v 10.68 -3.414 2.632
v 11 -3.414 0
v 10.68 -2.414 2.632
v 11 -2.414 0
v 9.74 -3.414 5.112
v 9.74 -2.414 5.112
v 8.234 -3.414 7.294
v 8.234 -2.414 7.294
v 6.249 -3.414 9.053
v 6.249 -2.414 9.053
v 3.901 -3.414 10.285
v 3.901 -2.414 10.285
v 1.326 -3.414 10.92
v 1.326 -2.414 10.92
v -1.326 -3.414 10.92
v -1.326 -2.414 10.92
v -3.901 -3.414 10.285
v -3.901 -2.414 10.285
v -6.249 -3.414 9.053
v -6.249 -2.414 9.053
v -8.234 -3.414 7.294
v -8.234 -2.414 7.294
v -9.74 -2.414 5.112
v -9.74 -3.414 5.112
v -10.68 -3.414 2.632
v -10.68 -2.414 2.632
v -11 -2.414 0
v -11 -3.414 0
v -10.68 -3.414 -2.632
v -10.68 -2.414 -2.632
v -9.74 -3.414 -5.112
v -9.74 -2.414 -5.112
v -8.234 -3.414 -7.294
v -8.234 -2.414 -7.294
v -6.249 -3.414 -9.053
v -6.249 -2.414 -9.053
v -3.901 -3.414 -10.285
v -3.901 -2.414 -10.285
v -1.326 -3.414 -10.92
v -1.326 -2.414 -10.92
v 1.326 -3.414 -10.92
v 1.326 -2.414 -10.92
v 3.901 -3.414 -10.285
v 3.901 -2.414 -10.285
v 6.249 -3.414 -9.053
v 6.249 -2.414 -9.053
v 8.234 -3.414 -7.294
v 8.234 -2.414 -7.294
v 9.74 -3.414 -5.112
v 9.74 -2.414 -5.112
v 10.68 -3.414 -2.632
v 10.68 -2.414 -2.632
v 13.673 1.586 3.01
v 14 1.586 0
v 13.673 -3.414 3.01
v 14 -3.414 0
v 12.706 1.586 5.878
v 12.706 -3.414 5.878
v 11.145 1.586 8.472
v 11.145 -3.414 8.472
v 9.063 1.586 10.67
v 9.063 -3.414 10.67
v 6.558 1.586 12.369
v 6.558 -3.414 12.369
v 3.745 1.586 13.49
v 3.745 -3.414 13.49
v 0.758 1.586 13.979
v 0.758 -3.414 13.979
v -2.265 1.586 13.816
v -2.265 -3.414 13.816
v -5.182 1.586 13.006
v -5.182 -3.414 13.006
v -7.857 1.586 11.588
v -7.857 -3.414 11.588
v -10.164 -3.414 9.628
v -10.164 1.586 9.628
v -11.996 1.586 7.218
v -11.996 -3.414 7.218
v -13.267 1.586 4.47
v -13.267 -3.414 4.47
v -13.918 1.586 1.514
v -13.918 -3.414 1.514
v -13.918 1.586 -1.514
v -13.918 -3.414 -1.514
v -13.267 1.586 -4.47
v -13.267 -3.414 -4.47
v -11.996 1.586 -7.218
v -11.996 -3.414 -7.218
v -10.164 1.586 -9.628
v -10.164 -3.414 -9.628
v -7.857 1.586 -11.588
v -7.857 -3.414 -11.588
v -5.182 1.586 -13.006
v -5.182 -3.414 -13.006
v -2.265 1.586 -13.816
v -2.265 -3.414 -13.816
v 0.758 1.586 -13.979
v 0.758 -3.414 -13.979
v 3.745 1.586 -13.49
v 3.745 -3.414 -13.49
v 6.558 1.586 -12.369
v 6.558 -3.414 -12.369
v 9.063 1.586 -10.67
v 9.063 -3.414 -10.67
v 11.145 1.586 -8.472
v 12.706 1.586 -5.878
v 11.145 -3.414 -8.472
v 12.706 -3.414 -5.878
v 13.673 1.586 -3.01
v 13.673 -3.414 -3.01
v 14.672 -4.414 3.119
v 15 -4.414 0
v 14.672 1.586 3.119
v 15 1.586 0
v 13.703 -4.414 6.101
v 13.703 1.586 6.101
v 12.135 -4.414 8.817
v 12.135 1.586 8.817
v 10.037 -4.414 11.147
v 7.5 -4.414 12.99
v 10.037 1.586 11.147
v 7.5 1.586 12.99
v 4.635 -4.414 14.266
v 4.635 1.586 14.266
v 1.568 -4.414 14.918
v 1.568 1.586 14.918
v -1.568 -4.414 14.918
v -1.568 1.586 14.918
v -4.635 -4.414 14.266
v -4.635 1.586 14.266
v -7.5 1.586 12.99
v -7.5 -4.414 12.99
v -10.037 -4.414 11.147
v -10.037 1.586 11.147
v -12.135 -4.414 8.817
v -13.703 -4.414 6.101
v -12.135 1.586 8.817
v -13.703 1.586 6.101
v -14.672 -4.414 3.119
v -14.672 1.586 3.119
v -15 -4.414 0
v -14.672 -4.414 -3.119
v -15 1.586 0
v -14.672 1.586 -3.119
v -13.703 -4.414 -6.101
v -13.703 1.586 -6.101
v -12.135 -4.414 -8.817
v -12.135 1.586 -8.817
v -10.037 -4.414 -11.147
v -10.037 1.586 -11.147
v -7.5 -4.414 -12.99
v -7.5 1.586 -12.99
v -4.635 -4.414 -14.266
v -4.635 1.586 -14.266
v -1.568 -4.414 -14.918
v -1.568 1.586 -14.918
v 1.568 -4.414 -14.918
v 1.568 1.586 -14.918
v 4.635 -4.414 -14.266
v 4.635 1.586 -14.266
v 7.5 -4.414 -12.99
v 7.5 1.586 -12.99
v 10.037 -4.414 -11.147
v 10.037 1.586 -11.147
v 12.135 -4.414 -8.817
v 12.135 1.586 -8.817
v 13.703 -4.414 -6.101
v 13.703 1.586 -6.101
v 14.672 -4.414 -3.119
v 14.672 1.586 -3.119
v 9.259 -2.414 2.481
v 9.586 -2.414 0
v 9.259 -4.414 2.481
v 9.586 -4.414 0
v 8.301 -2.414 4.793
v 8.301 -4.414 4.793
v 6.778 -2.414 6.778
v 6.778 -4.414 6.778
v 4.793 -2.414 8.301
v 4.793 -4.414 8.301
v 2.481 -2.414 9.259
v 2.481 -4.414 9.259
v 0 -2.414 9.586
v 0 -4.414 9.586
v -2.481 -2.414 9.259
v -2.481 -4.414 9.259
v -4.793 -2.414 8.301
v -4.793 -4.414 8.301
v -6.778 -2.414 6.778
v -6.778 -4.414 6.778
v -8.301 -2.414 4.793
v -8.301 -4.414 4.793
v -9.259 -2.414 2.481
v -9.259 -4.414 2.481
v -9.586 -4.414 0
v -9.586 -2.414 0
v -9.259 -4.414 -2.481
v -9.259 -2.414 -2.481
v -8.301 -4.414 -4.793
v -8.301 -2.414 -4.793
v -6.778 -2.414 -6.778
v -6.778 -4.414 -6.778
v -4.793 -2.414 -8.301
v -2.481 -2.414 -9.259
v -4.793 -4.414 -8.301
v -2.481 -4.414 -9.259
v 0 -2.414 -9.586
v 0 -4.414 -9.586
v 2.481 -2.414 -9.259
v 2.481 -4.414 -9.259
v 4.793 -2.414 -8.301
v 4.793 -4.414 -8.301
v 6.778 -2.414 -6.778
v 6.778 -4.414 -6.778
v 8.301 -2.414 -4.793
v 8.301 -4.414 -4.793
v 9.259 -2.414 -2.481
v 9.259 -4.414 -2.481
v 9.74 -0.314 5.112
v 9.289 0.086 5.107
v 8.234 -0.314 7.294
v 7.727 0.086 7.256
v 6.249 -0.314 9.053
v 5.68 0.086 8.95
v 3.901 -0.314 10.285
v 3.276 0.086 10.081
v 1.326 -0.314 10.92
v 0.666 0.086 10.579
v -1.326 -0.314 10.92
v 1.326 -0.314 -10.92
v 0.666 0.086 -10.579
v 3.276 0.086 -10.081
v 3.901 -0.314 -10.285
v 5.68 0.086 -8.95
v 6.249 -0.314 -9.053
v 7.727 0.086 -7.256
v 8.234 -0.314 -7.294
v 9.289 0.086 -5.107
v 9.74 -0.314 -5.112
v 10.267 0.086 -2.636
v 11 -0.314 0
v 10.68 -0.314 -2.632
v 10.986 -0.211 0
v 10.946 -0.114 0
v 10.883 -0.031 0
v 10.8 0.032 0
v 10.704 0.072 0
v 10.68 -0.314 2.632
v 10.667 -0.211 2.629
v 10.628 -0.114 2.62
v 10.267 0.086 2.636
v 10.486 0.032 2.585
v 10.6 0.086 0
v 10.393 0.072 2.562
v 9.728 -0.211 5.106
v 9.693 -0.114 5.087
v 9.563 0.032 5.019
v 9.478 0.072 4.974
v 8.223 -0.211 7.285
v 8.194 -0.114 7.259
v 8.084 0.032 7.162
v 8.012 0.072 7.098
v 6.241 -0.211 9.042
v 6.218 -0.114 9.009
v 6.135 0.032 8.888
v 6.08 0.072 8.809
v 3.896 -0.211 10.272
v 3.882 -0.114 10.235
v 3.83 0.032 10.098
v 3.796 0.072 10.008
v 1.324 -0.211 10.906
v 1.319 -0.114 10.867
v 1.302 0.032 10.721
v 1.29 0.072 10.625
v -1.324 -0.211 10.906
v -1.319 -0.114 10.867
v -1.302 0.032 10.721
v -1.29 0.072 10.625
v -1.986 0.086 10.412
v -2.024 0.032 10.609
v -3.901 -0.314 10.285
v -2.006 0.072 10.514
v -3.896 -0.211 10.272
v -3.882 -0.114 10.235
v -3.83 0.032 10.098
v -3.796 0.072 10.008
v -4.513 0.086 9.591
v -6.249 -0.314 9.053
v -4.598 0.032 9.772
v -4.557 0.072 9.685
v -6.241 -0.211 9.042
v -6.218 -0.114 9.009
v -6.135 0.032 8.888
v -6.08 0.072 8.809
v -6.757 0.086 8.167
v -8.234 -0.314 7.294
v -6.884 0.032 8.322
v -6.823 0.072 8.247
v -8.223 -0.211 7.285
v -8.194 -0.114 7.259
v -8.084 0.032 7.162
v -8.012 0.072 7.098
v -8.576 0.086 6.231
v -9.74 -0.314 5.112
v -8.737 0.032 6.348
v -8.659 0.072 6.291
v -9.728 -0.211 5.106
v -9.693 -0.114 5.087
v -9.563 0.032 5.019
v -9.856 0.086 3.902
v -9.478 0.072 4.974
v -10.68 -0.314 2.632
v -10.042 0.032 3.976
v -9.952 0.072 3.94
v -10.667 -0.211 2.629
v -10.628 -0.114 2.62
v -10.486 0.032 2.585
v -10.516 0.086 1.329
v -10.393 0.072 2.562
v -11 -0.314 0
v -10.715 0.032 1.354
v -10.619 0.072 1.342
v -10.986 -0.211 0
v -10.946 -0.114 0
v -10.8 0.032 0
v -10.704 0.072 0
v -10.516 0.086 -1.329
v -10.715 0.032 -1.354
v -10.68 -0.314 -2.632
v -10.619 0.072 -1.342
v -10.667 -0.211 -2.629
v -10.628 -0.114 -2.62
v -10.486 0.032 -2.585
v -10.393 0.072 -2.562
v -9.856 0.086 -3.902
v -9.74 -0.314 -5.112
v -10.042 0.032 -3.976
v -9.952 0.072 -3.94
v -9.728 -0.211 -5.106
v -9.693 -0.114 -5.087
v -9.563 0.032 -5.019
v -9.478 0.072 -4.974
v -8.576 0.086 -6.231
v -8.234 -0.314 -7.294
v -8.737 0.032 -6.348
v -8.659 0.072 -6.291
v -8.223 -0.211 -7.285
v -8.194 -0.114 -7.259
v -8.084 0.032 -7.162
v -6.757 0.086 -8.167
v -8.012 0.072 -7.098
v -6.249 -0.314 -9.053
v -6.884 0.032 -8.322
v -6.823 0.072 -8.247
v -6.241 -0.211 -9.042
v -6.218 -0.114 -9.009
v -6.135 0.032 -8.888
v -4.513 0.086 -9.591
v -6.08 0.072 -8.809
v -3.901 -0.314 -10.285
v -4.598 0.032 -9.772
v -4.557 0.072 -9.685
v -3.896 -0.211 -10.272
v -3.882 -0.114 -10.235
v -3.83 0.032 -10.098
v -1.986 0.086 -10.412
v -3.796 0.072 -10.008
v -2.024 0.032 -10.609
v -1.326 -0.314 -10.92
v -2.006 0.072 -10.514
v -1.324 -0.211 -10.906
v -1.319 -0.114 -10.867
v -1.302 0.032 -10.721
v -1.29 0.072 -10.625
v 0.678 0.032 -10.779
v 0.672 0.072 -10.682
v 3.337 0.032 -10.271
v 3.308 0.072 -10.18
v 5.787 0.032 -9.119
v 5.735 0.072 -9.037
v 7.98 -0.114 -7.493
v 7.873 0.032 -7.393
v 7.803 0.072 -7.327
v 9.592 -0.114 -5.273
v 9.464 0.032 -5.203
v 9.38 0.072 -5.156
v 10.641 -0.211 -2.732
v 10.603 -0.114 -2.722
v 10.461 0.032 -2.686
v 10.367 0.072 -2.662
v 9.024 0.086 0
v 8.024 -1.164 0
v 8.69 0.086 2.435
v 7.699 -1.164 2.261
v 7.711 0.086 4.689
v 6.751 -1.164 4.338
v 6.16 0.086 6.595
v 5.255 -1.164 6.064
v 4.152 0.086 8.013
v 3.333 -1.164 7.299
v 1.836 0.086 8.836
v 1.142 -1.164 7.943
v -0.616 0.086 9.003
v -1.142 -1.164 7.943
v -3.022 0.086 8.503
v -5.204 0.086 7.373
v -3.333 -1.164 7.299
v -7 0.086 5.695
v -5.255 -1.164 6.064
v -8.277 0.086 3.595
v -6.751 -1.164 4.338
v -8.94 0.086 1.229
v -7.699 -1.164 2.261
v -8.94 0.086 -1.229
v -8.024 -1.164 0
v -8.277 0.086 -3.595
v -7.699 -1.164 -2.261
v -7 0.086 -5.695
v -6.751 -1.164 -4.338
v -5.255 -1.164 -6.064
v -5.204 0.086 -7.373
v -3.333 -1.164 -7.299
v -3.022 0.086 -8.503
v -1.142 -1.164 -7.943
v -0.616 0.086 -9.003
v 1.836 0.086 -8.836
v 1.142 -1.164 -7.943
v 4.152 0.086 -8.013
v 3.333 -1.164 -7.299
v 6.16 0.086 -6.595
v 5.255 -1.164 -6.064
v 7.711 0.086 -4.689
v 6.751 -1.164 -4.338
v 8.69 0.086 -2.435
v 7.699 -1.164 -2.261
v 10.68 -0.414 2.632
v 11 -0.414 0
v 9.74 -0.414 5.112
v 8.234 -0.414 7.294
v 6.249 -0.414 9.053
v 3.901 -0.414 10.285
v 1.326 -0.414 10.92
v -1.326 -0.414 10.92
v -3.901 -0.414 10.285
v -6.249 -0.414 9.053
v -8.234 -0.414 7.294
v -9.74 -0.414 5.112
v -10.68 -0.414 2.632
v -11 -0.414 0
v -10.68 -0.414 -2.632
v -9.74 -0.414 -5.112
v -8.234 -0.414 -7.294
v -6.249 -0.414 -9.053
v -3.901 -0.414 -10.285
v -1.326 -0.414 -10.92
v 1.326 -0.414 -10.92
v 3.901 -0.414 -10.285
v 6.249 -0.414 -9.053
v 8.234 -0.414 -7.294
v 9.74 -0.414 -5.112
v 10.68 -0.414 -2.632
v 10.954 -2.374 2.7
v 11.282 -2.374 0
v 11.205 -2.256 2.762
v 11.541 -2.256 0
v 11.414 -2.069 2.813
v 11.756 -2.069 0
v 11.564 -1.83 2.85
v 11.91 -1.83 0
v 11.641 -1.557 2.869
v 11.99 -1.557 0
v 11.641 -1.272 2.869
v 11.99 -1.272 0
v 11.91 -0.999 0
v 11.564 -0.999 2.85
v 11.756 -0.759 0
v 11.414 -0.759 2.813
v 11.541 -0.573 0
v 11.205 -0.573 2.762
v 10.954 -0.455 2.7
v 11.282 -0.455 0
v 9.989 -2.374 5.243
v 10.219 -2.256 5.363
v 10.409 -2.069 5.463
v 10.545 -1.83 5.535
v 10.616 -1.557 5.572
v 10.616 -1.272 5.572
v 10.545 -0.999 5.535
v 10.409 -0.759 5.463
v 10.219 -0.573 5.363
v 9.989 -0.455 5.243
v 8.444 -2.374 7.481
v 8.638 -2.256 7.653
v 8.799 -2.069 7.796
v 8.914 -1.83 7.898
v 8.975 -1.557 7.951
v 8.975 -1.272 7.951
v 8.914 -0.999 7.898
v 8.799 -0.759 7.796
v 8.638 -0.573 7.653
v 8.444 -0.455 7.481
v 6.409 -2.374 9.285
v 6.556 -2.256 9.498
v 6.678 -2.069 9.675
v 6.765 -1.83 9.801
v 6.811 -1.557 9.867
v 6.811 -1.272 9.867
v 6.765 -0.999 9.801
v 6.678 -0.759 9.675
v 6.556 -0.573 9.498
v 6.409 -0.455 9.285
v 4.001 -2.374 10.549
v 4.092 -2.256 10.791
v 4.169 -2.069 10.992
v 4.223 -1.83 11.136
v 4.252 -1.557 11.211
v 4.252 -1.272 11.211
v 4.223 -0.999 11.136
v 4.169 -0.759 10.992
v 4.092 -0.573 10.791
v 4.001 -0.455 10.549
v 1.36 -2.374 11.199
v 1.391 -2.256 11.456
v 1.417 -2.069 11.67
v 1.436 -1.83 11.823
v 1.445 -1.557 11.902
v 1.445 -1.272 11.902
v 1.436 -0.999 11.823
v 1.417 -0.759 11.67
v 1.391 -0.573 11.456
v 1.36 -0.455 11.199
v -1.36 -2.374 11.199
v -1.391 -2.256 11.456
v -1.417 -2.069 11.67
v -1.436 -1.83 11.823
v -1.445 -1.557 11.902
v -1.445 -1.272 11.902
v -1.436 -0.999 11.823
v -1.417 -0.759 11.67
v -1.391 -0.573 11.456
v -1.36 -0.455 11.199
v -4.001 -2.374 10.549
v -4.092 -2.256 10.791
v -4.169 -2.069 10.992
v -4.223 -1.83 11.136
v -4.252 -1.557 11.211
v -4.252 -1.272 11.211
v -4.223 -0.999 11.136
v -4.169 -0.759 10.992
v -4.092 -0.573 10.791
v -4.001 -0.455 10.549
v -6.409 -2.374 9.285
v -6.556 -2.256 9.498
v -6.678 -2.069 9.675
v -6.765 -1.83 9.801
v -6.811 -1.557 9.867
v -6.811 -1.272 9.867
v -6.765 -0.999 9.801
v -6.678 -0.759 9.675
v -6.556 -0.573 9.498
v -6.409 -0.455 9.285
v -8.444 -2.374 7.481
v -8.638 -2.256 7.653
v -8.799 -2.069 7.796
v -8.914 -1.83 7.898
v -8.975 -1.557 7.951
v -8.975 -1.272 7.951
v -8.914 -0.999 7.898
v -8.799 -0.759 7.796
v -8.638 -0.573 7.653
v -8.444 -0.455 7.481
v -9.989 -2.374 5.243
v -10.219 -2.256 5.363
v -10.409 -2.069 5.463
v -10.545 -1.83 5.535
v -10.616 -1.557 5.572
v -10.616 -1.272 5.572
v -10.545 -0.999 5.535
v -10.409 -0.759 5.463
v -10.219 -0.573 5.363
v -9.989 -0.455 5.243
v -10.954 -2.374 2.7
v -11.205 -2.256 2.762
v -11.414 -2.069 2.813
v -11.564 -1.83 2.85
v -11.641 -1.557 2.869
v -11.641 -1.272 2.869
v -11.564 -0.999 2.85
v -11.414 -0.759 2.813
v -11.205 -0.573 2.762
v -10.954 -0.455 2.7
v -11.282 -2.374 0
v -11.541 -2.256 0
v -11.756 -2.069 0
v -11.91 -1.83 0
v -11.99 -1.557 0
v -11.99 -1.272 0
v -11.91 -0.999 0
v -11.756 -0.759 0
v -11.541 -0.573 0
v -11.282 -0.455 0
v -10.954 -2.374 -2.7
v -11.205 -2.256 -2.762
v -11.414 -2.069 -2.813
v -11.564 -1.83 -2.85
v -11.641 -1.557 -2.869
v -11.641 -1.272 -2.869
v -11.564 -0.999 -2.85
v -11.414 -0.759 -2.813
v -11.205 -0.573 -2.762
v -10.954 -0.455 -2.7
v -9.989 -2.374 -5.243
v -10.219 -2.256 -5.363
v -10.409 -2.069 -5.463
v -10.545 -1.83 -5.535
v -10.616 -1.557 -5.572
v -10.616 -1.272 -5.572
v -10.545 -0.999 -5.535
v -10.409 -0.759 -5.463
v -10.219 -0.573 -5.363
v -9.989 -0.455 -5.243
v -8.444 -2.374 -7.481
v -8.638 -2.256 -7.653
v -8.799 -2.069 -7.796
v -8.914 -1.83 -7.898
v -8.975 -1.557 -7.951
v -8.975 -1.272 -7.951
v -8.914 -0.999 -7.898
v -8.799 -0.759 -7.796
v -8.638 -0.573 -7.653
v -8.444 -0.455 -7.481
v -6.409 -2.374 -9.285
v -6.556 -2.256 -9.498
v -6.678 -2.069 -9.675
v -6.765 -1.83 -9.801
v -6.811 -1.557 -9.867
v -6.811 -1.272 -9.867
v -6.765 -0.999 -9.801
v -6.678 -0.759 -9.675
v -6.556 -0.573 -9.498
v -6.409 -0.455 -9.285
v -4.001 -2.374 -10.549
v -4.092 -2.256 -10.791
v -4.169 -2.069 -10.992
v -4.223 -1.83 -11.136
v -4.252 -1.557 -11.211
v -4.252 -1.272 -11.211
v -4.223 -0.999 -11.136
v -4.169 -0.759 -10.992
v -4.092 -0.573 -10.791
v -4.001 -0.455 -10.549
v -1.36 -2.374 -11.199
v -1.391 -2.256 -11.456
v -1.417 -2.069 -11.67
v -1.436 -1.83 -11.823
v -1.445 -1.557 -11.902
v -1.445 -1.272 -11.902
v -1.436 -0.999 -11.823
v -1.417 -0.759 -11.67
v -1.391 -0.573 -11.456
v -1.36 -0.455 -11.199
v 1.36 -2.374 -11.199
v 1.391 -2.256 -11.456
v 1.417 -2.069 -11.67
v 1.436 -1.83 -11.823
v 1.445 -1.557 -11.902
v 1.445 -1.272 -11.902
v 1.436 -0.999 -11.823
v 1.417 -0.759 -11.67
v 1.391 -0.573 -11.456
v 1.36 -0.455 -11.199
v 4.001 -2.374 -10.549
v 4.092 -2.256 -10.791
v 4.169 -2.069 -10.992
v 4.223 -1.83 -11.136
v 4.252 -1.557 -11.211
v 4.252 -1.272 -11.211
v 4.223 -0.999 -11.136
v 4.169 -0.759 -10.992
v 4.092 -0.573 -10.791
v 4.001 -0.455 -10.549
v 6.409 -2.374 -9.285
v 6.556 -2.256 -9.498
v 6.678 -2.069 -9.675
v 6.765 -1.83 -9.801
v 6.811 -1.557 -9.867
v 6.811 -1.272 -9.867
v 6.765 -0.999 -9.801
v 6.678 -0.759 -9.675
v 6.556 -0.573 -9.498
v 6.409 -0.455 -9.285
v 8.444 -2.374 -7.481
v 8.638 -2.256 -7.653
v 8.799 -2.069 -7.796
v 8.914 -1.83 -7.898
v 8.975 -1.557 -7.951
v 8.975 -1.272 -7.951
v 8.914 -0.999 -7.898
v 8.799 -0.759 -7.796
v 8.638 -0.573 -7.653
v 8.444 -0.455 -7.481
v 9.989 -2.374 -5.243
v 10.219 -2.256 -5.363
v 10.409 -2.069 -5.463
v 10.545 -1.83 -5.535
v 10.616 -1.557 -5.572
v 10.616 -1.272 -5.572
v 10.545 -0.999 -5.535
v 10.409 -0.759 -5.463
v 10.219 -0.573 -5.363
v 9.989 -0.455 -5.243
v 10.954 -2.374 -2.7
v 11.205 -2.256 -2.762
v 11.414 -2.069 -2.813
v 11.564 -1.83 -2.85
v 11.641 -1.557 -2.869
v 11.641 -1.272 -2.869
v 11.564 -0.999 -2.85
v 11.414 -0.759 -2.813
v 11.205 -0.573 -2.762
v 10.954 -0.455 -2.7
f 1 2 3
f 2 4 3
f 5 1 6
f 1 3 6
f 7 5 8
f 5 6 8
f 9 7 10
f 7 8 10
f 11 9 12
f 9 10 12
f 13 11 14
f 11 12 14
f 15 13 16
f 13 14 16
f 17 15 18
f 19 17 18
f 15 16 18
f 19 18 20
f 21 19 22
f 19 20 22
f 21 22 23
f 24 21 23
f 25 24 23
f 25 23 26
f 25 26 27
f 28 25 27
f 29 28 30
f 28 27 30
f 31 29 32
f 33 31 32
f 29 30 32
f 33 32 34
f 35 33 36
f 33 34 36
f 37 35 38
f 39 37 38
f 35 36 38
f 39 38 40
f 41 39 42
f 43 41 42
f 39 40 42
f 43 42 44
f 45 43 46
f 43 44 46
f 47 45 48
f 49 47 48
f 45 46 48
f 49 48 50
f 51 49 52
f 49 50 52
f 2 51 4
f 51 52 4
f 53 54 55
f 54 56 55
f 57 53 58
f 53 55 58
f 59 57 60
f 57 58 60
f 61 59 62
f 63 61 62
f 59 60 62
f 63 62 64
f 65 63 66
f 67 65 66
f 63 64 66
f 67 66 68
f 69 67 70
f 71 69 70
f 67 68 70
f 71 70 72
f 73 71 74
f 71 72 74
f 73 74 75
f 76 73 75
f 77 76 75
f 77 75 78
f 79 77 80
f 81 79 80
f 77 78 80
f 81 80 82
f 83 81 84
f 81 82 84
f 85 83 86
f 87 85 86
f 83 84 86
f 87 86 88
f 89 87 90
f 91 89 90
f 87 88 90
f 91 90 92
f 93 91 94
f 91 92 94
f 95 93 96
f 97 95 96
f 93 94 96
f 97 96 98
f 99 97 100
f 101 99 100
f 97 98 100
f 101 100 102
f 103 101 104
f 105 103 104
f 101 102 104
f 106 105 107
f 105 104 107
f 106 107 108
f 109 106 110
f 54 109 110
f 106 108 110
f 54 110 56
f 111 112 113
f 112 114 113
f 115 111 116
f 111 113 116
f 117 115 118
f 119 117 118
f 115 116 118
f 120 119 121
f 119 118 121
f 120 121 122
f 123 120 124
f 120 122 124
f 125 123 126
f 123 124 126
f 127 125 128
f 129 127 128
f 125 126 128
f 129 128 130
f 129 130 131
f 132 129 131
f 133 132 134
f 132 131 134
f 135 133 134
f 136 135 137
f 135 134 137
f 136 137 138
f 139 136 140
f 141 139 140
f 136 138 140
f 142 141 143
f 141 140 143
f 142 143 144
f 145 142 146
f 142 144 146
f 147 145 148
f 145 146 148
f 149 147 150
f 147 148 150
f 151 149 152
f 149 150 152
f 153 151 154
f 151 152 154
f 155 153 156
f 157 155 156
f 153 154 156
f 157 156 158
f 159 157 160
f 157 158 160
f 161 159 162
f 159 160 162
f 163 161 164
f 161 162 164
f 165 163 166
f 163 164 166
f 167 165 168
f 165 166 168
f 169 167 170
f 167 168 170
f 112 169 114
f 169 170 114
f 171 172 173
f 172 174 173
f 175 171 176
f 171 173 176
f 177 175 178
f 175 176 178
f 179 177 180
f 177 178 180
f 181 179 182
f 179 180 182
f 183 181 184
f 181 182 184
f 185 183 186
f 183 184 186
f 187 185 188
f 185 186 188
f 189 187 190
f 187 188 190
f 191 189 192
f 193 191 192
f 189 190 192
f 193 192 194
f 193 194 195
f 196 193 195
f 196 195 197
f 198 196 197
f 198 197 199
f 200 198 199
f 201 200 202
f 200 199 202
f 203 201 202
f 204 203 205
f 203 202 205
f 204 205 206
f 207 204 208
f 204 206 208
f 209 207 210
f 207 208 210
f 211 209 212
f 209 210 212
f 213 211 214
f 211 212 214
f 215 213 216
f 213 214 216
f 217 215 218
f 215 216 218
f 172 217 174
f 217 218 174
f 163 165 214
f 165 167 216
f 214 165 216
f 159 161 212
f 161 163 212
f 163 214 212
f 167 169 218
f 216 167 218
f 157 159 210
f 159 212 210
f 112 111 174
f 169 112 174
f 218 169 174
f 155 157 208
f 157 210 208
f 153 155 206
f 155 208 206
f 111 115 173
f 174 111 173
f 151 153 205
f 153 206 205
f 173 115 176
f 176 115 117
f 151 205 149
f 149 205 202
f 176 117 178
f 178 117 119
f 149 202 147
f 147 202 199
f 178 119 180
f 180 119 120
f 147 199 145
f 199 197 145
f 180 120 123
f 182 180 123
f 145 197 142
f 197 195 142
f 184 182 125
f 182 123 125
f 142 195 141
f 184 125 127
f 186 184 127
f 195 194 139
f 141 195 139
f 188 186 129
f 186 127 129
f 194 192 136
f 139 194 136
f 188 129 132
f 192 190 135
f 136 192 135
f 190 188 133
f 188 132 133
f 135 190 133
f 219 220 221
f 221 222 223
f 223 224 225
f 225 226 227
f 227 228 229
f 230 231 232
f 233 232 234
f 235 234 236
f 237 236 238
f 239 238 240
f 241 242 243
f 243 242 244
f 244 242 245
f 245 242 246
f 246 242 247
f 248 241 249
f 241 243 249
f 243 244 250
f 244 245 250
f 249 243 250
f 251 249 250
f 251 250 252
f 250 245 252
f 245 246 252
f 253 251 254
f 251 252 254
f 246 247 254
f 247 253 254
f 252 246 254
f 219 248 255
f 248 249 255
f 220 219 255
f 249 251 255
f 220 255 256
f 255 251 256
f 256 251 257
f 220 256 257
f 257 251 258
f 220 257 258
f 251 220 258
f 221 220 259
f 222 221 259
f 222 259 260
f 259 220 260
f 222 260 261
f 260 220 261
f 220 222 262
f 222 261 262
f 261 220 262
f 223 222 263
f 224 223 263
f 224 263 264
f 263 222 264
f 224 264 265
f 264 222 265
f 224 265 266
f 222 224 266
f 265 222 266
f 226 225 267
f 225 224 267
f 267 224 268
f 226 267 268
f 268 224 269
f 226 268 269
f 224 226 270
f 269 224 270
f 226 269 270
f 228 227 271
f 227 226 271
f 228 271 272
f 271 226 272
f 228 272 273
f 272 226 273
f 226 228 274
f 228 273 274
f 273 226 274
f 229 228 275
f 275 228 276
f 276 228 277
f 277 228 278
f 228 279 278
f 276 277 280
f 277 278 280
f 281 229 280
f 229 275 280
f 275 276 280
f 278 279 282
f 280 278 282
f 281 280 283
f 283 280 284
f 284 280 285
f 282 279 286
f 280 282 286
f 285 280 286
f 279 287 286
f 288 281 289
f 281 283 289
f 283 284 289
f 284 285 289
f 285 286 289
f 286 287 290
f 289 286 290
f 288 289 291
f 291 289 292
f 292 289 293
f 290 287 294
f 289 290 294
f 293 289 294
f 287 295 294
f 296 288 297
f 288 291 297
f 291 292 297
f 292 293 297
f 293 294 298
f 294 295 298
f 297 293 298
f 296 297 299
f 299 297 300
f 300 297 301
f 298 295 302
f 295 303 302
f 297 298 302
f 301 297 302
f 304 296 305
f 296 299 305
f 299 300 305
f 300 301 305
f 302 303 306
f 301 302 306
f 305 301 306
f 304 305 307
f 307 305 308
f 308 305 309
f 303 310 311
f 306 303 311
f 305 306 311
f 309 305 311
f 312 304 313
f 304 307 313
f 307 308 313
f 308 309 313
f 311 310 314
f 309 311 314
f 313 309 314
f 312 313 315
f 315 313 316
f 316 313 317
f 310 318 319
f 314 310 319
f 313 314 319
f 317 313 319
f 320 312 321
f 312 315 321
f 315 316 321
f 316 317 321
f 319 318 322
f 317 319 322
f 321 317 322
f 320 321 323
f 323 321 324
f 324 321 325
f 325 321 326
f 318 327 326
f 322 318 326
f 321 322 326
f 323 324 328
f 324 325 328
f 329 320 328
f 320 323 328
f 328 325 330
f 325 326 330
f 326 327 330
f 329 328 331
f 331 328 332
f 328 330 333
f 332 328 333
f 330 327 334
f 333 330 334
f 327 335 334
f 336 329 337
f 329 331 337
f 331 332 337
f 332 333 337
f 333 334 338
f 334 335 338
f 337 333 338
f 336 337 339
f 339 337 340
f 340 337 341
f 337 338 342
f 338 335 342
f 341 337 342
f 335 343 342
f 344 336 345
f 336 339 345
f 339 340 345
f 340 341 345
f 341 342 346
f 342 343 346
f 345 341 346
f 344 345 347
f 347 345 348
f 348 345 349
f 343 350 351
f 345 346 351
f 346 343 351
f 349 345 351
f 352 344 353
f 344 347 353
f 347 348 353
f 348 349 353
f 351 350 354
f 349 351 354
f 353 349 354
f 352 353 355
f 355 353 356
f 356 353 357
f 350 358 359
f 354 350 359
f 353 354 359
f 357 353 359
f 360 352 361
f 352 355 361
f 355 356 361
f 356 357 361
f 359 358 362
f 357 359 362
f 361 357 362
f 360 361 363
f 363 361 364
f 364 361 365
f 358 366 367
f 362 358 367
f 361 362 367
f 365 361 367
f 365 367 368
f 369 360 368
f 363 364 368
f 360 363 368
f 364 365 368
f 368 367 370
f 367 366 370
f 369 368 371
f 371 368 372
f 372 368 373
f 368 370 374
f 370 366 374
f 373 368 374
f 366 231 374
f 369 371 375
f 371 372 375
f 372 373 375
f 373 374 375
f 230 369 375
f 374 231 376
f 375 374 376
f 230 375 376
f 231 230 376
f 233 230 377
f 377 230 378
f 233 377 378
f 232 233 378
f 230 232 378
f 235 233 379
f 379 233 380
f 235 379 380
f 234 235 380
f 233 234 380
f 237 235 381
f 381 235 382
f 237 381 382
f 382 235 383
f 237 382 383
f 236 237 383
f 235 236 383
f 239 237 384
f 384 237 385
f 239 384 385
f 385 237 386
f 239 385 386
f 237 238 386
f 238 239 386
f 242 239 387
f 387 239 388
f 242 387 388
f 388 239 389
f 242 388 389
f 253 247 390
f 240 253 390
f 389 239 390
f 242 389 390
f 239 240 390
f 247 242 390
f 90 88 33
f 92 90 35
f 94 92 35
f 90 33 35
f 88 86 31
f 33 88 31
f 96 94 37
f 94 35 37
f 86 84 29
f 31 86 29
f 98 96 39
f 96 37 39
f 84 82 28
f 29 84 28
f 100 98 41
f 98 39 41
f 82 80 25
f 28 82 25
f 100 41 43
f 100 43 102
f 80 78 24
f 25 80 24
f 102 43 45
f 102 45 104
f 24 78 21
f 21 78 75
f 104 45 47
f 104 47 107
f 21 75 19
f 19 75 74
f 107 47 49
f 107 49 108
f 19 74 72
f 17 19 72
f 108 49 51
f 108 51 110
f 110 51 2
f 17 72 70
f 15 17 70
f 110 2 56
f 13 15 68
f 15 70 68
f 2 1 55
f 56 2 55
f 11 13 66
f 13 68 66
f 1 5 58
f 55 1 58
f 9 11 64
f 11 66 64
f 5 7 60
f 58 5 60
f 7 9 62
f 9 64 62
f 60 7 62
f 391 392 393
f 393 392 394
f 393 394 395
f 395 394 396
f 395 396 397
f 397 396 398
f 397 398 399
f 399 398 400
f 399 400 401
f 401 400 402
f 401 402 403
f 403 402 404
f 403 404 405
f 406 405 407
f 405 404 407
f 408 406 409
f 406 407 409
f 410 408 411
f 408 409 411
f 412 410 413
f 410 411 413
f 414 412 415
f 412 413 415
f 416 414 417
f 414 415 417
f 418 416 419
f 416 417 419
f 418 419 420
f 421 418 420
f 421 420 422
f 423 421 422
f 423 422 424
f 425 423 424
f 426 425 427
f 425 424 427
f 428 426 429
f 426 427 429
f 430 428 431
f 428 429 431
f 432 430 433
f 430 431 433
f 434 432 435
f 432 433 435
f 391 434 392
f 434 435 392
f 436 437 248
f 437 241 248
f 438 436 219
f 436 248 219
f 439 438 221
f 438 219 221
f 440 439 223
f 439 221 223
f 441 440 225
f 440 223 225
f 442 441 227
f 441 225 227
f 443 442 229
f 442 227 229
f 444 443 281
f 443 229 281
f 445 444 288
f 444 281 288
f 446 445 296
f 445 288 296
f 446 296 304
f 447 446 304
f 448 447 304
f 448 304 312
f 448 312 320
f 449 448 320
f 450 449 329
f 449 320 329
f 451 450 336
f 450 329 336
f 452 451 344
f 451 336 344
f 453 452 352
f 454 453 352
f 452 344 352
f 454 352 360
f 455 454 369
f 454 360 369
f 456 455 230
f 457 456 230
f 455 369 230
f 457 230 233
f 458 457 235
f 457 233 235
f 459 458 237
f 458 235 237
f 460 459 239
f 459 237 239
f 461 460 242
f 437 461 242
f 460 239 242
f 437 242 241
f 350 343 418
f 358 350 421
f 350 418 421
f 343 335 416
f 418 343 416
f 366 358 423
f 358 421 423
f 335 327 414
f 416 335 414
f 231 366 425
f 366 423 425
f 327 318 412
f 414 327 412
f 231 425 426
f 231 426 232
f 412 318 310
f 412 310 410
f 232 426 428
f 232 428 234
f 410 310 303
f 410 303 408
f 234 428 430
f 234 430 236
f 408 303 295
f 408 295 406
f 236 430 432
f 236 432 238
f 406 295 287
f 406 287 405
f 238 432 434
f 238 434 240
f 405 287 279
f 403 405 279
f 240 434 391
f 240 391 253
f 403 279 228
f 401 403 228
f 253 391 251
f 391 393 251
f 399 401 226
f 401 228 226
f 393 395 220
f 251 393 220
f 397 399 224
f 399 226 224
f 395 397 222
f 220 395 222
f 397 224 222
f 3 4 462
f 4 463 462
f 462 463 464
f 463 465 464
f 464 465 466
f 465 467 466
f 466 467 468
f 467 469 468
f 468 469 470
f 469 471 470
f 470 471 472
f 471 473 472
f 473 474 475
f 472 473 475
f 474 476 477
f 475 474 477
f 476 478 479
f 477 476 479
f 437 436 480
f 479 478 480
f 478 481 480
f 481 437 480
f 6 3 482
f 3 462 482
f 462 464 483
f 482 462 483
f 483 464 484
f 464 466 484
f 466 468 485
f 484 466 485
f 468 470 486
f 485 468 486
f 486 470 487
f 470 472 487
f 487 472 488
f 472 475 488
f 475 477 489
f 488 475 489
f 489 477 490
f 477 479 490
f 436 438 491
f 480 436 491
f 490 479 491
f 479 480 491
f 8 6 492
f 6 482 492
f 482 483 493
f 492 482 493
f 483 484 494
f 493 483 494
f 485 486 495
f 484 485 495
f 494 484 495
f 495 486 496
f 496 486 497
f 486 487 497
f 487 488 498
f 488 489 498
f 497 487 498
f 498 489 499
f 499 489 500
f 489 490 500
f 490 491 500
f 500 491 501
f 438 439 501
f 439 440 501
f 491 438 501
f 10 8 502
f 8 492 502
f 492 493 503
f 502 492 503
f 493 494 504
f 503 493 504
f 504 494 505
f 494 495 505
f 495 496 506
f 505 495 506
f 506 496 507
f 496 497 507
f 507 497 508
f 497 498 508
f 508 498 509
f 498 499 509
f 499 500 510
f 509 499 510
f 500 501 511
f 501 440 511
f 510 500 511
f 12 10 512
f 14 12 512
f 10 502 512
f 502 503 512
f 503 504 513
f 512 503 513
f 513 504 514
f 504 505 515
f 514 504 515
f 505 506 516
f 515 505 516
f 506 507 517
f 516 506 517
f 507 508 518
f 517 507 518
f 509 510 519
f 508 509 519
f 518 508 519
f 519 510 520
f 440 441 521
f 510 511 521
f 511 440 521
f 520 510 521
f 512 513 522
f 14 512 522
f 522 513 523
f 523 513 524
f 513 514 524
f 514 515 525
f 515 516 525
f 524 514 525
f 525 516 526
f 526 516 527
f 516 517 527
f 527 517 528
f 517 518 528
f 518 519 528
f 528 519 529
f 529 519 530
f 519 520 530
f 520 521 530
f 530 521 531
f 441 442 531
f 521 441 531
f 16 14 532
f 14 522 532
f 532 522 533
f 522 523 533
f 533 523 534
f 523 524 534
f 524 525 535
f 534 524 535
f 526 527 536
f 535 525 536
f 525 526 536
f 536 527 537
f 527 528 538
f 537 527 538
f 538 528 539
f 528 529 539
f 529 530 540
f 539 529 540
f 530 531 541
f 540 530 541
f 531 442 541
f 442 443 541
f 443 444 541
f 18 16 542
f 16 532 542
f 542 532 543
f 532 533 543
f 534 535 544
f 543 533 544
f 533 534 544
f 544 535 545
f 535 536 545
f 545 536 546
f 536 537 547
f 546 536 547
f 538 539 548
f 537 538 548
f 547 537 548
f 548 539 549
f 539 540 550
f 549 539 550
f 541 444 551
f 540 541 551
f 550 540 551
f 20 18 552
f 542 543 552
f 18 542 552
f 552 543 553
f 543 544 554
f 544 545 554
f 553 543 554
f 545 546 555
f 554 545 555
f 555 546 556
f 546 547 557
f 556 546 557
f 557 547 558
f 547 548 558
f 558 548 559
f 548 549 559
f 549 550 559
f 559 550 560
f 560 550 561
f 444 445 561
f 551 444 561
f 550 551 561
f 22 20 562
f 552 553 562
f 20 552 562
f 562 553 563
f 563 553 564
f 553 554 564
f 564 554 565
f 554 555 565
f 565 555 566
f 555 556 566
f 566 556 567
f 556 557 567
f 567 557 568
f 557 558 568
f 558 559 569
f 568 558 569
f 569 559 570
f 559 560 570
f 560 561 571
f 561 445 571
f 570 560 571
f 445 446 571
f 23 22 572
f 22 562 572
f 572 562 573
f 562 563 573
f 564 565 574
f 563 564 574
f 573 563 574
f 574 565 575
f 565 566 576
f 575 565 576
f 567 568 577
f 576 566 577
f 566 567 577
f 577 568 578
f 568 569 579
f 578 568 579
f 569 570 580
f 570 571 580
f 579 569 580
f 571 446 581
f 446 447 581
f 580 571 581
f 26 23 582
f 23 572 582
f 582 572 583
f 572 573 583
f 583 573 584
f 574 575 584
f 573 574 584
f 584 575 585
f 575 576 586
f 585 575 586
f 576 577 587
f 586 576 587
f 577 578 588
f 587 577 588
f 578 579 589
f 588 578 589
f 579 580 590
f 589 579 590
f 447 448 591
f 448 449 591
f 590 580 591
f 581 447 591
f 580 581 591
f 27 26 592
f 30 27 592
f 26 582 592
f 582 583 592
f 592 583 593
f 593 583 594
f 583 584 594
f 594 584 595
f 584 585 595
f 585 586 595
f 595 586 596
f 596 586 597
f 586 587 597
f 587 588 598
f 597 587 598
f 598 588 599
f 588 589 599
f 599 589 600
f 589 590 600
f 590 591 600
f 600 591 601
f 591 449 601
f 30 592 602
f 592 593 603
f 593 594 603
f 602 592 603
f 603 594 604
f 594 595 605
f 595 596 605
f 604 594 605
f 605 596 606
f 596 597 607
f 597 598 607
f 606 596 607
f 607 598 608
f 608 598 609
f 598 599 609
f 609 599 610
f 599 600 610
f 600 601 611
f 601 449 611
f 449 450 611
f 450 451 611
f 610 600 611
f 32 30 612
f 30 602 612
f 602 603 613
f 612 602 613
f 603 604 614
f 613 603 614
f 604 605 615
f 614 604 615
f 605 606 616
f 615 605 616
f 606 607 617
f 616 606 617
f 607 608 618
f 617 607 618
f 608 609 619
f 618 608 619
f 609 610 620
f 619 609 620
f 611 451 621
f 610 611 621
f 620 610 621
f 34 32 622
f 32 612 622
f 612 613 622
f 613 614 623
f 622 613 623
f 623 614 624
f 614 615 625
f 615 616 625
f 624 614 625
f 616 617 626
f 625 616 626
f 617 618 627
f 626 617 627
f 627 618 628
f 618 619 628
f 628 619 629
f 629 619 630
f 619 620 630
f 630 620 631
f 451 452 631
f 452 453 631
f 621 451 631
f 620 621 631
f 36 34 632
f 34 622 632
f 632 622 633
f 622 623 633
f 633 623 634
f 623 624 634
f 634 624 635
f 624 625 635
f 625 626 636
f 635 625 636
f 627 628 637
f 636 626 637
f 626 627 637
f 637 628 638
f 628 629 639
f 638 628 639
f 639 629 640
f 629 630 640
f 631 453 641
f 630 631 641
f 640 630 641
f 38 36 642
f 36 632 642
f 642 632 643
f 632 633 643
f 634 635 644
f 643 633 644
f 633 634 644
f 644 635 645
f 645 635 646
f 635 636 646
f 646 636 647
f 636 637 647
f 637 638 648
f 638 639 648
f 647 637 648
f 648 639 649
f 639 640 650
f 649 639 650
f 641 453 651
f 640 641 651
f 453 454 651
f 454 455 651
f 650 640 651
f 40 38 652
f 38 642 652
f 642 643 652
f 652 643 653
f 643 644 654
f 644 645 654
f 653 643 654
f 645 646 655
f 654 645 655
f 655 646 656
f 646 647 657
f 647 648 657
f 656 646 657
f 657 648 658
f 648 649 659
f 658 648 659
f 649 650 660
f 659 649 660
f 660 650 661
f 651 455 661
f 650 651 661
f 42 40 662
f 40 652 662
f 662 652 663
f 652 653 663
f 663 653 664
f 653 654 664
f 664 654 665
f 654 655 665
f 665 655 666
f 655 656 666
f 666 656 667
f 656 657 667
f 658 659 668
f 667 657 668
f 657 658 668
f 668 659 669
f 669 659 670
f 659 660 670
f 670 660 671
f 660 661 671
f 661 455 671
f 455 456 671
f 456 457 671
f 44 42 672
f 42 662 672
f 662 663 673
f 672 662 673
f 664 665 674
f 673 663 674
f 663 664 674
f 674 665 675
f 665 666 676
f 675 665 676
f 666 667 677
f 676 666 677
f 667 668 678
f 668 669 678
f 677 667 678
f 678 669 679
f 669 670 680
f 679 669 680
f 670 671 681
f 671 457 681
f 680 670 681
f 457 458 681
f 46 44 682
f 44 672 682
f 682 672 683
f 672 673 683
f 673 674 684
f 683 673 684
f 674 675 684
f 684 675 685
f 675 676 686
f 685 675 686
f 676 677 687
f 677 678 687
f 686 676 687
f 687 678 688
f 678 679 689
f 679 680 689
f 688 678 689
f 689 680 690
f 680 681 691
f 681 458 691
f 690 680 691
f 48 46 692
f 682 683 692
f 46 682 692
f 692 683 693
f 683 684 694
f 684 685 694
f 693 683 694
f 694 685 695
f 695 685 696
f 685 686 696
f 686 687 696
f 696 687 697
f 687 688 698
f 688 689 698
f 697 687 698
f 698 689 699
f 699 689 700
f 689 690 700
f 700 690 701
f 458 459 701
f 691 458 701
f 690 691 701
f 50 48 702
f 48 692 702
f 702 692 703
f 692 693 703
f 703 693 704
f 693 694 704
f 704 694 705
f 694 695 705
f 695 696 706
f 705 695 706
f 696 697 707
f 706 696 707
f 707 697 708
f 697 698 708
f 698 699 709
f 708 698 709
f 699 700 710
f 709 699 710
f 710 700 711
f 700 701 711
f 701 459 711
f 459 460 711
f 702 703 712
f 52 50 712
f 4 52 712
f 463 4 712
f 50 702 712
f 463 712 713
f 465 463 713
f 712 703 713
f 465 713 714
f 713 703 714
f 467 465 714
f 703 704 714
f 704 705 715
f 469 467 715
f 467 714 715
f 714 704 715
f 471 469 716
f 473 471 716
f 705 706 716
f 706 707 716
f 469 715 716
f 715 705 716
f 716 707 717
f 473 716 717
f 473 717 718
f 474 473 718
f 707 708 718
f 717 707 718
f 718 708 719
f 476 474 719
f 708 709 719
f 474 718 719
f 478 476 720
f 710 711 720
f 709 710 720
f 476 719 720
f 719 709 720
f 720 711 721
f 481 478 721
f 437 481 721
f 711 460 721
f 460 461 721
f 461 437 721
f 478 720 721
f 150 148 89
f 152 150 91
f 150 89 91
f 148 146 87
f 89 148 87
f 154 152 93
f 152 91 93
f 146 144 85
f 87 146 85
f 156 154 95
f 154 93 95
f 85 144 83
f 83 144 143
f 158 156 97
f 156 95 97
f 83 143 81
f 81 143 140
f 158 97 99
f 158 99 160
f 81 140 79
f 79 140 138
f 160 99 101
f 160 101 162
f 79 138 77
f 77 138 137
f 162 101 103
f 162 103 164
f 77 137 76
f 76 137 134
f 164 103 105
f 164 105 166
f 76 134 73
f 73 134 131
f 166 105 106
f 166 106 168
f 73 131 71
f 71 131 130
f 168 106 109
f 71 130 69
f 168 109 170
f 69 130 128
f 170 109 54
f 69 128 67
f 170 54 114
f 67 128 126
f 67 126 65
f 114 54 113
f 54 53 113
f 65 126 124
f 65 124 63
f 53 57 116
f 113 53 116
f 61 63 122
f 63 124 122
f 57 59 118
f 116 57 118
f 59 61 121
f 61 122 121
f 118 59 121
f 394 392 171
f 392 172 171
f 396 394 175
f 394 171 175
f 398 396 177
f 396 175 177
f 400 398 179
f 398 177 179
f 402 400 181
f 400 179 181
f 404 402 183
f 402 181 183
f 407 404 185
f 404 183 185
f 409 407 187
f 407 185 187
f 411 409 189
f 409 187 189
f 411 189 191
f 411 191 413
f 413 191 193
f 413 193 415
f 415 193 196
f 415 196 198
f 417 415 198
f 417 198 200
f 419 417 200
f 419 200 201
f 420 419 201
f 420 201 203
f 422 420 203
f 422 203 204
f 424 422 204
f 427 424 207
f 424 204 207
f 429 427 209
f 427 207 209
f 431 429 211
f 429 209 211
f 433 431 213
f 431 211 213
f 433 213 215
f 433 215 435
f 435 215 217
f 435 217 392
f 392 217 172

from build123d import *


with BuildPart() as part:
    # Sketch1 → Revolve1 (revolve)
    with BuildSketch(Plane.XY):
        with BuildLine():
            Line((9.585714286, -4.414285714), (15, -4.414285714))
            Line((15, -4.414285714), (15, 1.585714286))
            Line((15, 1.585714286), (14, 1.585714286))
            Line((14, 1.585714286), (14, -3.414285714))
            Line((14, -3.414285714), (11, -3.414285714))
            Line((11, -3.414285714), (11, -2.414285714))
            ThreePointArc((11, -2.414285714), (12, -1.414285714), (11, -0.414285714))
            Line((11, -0.414285714), (11, -0.314285714))
            ThreePointArc((11, -0.314285714), (10.882842712, -0.031443002), (10.6, 0.085714286))
            Line((10.6, 0.085714286), (9.024464786, 0.085714286))
            Line((9.024464786, 0.085714286), (8.024464786, -1.164285714))
            Line((8.024464786, -1.164285714), (9.585714286, -2.414285714))
            Line((9.585714286, -2.414285714), (9.585714286, -4.414285714))
        make_face()
    revolve(axis=Axis((0, 14.828571429, 0), (0, -1, 0)))


solid = part.part
